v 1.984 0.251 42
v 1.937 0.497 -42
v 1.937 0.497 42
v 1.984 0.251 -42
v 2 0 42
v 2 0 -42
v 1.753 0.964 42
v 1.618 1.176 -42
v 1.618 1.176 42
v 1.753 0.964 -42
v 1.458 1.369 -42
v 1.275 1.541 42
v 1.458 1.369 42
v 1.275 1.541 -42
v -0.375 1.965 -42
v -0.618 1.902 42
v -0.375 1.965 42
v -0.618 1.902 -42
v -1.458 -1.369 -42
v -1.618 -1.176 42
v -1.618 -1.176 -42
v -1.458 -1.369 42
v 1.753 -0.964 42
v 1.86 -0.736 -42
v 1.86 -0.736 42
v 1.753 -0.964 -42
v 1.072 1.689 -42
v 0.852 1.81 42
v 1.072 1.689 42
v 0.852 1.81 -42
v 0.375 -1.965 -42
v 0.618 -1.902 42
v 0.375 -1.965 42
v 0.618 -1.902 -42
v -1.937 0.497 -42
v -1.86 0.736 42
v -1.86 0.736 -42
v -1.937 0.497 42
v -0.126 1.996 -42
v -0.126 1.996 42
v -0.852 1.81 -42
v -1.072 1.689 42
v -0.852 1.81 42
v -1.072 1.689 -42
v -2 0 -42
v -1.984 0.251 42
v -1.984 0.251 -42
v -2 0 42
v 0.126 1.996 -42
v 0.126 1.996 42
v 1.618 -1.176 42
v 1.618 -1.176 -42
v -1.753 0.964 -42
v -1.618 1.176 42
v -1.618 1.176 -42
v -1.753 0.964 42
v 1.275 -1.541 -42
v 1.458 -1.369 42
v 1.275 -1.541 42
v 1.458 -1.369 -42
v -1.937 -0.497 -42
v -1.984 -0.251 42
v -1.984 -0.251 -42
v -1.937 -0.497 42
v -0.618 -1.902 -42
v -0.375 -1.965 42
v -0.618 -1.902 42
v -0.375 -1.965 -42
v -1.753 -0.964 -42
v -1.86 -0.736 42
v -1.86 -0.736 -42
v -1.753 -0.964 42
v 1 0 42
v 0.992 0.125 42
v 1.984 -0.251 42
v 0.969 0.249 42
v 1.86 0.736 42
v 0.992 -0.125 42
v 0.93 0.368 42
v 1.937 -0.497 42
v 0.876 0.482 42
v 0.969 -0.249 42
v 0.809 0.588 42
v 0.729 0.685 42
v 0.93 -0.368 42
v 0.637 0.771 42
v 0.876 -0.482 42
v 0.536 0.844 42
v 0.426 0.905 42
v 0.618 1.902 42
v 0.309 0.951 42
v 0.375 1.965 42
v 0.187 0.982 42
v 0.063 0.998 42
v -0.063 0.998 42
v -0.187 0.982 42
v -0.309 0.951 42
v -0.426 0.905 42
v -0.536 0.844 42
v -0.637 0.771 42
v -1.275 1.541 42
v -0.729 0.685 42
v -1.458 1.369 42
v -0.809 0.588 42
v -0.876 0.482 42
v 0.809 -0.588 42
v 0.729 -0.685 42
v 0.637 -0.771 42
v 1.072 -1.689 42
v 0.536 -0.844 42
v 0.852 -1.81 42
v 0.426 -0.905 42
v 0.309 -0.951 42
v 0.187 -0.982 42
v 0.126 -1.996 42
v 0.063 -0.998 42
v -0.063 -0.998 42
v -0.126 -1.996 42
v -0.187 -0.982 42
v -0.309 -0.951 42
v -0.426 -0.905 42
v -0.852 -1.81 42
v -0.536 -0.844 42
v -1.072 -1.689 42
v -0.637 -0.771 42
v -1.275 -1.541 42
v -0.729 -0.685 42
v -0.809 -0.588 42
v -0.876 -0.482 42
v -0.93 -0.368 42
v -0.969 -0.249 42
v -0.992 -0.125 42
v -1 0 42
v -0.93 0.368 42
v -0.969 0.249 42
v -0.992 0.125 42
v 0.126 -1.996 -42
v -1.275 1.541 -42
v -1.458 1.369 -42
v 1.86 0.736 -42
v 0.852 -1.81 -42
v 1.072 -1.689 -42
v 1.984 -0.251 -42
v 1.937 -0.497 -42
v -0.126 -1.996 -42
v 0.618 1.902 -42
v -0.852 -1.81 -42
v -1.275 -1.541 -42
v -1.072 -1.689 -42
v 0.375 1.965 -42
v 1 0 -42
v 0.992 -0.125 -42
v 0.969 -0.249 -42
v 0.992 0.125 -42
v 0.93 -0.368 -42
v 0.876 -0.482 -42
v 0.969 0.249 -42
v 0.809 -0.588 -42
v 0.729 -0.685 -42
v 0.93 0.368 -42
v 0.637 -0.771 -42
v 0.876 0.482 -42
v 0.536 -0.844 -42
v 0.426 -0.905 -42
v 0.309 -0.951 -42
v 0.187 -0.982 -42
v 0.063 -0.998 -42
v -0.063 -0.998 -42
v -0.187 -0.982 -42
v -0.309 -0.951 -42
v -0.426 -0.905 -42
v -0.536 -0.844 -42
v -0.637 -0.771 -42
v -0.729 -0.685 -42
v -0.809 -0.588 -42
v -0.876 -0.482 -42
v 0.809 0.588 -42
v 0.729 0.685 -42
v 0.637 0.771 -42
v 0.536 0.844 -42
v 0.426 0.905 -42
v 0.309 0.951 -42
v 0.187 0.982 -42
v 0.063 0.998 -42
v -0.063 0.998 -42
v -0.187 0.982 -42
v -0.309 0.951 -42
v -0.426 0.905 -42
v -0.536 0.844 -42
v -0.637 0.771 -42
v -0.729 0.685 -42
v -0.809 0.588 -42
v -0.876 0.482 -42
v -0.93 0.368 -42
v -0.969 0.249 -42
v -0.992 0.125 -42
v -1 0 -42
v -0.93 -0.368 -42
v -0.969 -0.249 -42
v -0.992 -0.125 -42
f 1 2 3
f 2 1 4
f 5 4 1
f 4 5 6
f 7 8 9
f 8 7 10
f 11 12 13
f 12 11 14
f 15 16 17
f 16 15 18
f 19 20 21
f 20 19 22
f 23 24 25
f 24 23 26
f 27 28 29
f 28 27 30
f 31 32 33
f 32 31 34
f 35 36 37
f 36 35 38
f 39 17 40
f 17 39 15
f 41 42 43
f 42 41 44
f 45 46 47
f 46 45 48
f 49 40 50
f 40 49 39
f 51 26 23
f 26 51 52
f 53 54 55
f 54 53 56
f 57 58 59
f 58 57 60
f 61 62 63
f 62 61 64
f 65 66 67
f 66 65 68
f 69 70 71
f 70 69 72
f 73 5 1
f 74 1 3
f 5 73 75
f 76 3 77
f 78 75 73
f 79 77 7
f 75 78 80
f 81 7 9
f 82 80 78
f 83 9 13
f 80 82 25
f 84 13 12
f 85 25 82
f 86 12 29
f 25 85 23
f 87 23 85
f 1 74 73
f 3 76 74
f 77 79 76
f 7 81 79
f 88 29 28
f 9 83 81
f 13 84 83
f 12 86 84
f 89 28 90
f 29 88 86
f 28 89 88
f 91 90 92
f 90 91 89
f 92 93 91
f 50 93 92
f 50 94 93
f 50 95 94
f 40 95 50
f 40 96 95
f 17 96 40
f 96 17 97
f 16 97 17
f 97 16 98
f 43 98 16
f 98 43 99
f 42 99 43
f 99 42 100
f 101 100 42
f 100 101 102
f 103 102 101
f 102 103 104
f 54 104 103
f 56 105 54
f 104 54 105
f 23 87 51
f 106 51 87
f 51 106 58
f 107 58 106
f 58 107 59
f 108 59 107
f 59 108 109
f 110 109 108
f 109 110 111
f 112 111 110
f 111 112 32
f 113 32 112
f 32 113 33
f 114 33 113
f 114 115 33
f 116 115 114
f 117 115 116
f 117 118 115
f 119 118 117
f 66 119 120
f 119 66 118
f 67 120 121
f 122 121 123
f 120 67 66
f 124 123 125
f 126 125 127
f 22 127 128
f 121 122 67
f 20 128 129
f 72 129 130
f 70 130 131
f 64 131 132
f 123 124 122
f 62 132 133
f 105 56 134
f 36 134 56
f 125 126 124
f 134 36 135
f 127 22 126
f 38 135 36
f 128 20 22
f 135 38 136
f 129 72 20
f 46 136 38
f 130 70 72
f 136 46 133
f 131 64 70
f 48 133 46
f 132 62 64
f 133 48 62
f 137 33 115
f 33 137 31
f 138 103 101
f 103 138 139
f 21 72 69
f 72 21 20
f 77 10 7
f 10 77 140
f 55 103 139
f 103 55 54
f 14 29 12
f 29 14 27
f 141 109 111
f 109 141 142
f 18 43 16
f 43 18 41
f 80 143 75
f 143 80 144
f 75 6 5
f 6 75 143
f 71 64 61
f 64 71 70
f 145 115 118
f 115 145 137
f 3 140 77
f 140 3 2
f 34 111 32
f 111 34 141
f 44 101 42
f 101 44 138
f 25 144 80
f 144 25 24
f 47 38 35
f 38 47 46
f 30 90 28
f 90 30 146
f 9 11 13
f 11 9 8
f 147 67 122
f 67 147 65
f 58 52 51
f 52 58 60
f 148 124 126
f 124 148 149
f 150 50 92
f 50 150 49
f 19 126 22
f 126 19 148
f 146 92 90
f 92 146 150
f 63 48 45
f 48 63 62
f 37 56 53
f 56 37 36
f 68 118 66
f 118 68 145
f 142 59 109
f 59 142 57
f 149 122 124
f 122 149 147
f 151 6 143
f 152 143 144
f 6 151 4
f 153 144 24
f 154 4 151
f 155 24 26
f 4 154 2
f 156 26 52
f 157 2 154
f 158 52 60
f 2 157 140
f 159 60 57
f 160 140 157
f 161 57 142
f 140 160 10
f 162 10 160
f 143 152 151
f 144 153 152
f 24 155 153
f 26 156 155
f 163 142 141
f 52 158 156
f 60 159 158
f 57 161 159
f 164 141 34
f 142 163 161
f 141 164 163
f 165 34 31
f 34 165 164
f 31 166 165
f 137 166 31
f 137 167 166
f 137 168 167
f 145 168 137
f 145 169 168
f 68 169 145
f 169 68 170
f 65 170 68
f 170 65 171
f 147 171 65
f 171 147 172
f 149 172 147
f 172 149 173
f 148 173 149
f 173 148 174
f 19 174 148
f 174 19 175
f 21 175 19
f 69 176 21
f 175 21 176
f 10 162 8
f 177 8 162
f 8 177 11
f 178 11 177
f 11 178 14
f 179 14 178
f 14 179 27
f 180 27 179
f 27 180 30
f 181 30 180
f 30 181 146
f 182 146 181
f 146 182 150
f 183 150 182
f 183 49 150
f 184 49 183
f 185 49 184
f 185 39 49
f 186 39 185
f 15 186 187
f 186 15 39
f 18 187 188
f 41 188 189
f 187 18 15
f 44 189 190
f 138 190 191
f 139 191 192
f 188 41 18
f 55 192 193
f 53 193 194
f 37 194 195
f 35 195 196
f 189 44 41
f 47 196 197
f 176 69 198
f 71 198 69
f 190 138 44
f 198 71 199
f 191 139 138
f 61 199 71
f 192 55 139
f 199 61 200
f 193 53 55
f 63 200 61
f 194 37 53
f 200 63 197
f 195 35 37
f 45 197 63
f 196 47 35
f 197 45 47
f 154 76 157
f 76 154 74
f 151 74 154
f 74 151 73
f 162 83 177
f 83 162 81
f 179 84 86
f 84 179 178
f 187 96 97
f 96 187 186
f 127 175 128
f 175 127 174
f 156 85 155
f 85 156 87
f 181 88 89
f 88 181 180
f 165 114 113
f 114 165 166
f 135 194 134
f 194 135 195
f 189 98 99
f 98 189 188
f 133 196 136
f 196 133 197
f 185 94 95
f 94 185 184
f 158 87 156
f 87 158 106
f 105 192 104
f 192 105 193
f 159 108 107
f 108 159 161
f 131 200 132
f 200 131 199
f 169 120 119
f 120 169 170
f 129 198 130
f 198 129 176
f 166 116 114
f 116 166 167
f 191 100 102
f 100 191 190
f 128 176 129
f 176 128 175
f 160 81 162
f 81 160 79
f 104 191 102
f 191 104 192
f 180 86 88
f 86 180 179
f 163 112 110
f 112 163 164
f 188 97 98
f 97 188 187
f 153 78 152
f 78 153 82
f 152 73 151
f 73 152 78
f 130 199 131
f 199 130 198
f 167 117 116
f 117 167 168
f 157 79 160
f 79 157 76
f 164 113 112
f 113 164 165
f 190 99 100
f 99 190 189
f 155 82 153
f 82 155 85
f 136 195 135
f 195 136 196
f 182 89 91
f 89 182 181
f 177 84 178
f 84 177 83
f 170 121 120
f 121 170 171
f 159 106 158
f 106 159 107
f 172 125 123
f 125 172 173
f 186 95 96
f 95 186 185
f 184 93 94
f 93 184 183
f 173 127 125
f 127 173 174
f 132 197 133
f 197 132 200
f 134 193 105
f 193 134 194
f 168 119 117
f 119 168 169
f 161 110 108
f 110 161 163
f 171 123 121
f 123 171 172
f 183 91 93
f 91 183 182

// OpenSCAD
$fn = 50;


difference() {
	union() {
		translate(v = [0, 0, -42.0000000000]) {
			cylinder(h = 84, r = 2.0000000000);
		}
	}
	union() {
		translate(v = [0, 0, -100.0000000000]) {
			cylinder(h = 200, r = 1.0000000000);
		}
	}
}
